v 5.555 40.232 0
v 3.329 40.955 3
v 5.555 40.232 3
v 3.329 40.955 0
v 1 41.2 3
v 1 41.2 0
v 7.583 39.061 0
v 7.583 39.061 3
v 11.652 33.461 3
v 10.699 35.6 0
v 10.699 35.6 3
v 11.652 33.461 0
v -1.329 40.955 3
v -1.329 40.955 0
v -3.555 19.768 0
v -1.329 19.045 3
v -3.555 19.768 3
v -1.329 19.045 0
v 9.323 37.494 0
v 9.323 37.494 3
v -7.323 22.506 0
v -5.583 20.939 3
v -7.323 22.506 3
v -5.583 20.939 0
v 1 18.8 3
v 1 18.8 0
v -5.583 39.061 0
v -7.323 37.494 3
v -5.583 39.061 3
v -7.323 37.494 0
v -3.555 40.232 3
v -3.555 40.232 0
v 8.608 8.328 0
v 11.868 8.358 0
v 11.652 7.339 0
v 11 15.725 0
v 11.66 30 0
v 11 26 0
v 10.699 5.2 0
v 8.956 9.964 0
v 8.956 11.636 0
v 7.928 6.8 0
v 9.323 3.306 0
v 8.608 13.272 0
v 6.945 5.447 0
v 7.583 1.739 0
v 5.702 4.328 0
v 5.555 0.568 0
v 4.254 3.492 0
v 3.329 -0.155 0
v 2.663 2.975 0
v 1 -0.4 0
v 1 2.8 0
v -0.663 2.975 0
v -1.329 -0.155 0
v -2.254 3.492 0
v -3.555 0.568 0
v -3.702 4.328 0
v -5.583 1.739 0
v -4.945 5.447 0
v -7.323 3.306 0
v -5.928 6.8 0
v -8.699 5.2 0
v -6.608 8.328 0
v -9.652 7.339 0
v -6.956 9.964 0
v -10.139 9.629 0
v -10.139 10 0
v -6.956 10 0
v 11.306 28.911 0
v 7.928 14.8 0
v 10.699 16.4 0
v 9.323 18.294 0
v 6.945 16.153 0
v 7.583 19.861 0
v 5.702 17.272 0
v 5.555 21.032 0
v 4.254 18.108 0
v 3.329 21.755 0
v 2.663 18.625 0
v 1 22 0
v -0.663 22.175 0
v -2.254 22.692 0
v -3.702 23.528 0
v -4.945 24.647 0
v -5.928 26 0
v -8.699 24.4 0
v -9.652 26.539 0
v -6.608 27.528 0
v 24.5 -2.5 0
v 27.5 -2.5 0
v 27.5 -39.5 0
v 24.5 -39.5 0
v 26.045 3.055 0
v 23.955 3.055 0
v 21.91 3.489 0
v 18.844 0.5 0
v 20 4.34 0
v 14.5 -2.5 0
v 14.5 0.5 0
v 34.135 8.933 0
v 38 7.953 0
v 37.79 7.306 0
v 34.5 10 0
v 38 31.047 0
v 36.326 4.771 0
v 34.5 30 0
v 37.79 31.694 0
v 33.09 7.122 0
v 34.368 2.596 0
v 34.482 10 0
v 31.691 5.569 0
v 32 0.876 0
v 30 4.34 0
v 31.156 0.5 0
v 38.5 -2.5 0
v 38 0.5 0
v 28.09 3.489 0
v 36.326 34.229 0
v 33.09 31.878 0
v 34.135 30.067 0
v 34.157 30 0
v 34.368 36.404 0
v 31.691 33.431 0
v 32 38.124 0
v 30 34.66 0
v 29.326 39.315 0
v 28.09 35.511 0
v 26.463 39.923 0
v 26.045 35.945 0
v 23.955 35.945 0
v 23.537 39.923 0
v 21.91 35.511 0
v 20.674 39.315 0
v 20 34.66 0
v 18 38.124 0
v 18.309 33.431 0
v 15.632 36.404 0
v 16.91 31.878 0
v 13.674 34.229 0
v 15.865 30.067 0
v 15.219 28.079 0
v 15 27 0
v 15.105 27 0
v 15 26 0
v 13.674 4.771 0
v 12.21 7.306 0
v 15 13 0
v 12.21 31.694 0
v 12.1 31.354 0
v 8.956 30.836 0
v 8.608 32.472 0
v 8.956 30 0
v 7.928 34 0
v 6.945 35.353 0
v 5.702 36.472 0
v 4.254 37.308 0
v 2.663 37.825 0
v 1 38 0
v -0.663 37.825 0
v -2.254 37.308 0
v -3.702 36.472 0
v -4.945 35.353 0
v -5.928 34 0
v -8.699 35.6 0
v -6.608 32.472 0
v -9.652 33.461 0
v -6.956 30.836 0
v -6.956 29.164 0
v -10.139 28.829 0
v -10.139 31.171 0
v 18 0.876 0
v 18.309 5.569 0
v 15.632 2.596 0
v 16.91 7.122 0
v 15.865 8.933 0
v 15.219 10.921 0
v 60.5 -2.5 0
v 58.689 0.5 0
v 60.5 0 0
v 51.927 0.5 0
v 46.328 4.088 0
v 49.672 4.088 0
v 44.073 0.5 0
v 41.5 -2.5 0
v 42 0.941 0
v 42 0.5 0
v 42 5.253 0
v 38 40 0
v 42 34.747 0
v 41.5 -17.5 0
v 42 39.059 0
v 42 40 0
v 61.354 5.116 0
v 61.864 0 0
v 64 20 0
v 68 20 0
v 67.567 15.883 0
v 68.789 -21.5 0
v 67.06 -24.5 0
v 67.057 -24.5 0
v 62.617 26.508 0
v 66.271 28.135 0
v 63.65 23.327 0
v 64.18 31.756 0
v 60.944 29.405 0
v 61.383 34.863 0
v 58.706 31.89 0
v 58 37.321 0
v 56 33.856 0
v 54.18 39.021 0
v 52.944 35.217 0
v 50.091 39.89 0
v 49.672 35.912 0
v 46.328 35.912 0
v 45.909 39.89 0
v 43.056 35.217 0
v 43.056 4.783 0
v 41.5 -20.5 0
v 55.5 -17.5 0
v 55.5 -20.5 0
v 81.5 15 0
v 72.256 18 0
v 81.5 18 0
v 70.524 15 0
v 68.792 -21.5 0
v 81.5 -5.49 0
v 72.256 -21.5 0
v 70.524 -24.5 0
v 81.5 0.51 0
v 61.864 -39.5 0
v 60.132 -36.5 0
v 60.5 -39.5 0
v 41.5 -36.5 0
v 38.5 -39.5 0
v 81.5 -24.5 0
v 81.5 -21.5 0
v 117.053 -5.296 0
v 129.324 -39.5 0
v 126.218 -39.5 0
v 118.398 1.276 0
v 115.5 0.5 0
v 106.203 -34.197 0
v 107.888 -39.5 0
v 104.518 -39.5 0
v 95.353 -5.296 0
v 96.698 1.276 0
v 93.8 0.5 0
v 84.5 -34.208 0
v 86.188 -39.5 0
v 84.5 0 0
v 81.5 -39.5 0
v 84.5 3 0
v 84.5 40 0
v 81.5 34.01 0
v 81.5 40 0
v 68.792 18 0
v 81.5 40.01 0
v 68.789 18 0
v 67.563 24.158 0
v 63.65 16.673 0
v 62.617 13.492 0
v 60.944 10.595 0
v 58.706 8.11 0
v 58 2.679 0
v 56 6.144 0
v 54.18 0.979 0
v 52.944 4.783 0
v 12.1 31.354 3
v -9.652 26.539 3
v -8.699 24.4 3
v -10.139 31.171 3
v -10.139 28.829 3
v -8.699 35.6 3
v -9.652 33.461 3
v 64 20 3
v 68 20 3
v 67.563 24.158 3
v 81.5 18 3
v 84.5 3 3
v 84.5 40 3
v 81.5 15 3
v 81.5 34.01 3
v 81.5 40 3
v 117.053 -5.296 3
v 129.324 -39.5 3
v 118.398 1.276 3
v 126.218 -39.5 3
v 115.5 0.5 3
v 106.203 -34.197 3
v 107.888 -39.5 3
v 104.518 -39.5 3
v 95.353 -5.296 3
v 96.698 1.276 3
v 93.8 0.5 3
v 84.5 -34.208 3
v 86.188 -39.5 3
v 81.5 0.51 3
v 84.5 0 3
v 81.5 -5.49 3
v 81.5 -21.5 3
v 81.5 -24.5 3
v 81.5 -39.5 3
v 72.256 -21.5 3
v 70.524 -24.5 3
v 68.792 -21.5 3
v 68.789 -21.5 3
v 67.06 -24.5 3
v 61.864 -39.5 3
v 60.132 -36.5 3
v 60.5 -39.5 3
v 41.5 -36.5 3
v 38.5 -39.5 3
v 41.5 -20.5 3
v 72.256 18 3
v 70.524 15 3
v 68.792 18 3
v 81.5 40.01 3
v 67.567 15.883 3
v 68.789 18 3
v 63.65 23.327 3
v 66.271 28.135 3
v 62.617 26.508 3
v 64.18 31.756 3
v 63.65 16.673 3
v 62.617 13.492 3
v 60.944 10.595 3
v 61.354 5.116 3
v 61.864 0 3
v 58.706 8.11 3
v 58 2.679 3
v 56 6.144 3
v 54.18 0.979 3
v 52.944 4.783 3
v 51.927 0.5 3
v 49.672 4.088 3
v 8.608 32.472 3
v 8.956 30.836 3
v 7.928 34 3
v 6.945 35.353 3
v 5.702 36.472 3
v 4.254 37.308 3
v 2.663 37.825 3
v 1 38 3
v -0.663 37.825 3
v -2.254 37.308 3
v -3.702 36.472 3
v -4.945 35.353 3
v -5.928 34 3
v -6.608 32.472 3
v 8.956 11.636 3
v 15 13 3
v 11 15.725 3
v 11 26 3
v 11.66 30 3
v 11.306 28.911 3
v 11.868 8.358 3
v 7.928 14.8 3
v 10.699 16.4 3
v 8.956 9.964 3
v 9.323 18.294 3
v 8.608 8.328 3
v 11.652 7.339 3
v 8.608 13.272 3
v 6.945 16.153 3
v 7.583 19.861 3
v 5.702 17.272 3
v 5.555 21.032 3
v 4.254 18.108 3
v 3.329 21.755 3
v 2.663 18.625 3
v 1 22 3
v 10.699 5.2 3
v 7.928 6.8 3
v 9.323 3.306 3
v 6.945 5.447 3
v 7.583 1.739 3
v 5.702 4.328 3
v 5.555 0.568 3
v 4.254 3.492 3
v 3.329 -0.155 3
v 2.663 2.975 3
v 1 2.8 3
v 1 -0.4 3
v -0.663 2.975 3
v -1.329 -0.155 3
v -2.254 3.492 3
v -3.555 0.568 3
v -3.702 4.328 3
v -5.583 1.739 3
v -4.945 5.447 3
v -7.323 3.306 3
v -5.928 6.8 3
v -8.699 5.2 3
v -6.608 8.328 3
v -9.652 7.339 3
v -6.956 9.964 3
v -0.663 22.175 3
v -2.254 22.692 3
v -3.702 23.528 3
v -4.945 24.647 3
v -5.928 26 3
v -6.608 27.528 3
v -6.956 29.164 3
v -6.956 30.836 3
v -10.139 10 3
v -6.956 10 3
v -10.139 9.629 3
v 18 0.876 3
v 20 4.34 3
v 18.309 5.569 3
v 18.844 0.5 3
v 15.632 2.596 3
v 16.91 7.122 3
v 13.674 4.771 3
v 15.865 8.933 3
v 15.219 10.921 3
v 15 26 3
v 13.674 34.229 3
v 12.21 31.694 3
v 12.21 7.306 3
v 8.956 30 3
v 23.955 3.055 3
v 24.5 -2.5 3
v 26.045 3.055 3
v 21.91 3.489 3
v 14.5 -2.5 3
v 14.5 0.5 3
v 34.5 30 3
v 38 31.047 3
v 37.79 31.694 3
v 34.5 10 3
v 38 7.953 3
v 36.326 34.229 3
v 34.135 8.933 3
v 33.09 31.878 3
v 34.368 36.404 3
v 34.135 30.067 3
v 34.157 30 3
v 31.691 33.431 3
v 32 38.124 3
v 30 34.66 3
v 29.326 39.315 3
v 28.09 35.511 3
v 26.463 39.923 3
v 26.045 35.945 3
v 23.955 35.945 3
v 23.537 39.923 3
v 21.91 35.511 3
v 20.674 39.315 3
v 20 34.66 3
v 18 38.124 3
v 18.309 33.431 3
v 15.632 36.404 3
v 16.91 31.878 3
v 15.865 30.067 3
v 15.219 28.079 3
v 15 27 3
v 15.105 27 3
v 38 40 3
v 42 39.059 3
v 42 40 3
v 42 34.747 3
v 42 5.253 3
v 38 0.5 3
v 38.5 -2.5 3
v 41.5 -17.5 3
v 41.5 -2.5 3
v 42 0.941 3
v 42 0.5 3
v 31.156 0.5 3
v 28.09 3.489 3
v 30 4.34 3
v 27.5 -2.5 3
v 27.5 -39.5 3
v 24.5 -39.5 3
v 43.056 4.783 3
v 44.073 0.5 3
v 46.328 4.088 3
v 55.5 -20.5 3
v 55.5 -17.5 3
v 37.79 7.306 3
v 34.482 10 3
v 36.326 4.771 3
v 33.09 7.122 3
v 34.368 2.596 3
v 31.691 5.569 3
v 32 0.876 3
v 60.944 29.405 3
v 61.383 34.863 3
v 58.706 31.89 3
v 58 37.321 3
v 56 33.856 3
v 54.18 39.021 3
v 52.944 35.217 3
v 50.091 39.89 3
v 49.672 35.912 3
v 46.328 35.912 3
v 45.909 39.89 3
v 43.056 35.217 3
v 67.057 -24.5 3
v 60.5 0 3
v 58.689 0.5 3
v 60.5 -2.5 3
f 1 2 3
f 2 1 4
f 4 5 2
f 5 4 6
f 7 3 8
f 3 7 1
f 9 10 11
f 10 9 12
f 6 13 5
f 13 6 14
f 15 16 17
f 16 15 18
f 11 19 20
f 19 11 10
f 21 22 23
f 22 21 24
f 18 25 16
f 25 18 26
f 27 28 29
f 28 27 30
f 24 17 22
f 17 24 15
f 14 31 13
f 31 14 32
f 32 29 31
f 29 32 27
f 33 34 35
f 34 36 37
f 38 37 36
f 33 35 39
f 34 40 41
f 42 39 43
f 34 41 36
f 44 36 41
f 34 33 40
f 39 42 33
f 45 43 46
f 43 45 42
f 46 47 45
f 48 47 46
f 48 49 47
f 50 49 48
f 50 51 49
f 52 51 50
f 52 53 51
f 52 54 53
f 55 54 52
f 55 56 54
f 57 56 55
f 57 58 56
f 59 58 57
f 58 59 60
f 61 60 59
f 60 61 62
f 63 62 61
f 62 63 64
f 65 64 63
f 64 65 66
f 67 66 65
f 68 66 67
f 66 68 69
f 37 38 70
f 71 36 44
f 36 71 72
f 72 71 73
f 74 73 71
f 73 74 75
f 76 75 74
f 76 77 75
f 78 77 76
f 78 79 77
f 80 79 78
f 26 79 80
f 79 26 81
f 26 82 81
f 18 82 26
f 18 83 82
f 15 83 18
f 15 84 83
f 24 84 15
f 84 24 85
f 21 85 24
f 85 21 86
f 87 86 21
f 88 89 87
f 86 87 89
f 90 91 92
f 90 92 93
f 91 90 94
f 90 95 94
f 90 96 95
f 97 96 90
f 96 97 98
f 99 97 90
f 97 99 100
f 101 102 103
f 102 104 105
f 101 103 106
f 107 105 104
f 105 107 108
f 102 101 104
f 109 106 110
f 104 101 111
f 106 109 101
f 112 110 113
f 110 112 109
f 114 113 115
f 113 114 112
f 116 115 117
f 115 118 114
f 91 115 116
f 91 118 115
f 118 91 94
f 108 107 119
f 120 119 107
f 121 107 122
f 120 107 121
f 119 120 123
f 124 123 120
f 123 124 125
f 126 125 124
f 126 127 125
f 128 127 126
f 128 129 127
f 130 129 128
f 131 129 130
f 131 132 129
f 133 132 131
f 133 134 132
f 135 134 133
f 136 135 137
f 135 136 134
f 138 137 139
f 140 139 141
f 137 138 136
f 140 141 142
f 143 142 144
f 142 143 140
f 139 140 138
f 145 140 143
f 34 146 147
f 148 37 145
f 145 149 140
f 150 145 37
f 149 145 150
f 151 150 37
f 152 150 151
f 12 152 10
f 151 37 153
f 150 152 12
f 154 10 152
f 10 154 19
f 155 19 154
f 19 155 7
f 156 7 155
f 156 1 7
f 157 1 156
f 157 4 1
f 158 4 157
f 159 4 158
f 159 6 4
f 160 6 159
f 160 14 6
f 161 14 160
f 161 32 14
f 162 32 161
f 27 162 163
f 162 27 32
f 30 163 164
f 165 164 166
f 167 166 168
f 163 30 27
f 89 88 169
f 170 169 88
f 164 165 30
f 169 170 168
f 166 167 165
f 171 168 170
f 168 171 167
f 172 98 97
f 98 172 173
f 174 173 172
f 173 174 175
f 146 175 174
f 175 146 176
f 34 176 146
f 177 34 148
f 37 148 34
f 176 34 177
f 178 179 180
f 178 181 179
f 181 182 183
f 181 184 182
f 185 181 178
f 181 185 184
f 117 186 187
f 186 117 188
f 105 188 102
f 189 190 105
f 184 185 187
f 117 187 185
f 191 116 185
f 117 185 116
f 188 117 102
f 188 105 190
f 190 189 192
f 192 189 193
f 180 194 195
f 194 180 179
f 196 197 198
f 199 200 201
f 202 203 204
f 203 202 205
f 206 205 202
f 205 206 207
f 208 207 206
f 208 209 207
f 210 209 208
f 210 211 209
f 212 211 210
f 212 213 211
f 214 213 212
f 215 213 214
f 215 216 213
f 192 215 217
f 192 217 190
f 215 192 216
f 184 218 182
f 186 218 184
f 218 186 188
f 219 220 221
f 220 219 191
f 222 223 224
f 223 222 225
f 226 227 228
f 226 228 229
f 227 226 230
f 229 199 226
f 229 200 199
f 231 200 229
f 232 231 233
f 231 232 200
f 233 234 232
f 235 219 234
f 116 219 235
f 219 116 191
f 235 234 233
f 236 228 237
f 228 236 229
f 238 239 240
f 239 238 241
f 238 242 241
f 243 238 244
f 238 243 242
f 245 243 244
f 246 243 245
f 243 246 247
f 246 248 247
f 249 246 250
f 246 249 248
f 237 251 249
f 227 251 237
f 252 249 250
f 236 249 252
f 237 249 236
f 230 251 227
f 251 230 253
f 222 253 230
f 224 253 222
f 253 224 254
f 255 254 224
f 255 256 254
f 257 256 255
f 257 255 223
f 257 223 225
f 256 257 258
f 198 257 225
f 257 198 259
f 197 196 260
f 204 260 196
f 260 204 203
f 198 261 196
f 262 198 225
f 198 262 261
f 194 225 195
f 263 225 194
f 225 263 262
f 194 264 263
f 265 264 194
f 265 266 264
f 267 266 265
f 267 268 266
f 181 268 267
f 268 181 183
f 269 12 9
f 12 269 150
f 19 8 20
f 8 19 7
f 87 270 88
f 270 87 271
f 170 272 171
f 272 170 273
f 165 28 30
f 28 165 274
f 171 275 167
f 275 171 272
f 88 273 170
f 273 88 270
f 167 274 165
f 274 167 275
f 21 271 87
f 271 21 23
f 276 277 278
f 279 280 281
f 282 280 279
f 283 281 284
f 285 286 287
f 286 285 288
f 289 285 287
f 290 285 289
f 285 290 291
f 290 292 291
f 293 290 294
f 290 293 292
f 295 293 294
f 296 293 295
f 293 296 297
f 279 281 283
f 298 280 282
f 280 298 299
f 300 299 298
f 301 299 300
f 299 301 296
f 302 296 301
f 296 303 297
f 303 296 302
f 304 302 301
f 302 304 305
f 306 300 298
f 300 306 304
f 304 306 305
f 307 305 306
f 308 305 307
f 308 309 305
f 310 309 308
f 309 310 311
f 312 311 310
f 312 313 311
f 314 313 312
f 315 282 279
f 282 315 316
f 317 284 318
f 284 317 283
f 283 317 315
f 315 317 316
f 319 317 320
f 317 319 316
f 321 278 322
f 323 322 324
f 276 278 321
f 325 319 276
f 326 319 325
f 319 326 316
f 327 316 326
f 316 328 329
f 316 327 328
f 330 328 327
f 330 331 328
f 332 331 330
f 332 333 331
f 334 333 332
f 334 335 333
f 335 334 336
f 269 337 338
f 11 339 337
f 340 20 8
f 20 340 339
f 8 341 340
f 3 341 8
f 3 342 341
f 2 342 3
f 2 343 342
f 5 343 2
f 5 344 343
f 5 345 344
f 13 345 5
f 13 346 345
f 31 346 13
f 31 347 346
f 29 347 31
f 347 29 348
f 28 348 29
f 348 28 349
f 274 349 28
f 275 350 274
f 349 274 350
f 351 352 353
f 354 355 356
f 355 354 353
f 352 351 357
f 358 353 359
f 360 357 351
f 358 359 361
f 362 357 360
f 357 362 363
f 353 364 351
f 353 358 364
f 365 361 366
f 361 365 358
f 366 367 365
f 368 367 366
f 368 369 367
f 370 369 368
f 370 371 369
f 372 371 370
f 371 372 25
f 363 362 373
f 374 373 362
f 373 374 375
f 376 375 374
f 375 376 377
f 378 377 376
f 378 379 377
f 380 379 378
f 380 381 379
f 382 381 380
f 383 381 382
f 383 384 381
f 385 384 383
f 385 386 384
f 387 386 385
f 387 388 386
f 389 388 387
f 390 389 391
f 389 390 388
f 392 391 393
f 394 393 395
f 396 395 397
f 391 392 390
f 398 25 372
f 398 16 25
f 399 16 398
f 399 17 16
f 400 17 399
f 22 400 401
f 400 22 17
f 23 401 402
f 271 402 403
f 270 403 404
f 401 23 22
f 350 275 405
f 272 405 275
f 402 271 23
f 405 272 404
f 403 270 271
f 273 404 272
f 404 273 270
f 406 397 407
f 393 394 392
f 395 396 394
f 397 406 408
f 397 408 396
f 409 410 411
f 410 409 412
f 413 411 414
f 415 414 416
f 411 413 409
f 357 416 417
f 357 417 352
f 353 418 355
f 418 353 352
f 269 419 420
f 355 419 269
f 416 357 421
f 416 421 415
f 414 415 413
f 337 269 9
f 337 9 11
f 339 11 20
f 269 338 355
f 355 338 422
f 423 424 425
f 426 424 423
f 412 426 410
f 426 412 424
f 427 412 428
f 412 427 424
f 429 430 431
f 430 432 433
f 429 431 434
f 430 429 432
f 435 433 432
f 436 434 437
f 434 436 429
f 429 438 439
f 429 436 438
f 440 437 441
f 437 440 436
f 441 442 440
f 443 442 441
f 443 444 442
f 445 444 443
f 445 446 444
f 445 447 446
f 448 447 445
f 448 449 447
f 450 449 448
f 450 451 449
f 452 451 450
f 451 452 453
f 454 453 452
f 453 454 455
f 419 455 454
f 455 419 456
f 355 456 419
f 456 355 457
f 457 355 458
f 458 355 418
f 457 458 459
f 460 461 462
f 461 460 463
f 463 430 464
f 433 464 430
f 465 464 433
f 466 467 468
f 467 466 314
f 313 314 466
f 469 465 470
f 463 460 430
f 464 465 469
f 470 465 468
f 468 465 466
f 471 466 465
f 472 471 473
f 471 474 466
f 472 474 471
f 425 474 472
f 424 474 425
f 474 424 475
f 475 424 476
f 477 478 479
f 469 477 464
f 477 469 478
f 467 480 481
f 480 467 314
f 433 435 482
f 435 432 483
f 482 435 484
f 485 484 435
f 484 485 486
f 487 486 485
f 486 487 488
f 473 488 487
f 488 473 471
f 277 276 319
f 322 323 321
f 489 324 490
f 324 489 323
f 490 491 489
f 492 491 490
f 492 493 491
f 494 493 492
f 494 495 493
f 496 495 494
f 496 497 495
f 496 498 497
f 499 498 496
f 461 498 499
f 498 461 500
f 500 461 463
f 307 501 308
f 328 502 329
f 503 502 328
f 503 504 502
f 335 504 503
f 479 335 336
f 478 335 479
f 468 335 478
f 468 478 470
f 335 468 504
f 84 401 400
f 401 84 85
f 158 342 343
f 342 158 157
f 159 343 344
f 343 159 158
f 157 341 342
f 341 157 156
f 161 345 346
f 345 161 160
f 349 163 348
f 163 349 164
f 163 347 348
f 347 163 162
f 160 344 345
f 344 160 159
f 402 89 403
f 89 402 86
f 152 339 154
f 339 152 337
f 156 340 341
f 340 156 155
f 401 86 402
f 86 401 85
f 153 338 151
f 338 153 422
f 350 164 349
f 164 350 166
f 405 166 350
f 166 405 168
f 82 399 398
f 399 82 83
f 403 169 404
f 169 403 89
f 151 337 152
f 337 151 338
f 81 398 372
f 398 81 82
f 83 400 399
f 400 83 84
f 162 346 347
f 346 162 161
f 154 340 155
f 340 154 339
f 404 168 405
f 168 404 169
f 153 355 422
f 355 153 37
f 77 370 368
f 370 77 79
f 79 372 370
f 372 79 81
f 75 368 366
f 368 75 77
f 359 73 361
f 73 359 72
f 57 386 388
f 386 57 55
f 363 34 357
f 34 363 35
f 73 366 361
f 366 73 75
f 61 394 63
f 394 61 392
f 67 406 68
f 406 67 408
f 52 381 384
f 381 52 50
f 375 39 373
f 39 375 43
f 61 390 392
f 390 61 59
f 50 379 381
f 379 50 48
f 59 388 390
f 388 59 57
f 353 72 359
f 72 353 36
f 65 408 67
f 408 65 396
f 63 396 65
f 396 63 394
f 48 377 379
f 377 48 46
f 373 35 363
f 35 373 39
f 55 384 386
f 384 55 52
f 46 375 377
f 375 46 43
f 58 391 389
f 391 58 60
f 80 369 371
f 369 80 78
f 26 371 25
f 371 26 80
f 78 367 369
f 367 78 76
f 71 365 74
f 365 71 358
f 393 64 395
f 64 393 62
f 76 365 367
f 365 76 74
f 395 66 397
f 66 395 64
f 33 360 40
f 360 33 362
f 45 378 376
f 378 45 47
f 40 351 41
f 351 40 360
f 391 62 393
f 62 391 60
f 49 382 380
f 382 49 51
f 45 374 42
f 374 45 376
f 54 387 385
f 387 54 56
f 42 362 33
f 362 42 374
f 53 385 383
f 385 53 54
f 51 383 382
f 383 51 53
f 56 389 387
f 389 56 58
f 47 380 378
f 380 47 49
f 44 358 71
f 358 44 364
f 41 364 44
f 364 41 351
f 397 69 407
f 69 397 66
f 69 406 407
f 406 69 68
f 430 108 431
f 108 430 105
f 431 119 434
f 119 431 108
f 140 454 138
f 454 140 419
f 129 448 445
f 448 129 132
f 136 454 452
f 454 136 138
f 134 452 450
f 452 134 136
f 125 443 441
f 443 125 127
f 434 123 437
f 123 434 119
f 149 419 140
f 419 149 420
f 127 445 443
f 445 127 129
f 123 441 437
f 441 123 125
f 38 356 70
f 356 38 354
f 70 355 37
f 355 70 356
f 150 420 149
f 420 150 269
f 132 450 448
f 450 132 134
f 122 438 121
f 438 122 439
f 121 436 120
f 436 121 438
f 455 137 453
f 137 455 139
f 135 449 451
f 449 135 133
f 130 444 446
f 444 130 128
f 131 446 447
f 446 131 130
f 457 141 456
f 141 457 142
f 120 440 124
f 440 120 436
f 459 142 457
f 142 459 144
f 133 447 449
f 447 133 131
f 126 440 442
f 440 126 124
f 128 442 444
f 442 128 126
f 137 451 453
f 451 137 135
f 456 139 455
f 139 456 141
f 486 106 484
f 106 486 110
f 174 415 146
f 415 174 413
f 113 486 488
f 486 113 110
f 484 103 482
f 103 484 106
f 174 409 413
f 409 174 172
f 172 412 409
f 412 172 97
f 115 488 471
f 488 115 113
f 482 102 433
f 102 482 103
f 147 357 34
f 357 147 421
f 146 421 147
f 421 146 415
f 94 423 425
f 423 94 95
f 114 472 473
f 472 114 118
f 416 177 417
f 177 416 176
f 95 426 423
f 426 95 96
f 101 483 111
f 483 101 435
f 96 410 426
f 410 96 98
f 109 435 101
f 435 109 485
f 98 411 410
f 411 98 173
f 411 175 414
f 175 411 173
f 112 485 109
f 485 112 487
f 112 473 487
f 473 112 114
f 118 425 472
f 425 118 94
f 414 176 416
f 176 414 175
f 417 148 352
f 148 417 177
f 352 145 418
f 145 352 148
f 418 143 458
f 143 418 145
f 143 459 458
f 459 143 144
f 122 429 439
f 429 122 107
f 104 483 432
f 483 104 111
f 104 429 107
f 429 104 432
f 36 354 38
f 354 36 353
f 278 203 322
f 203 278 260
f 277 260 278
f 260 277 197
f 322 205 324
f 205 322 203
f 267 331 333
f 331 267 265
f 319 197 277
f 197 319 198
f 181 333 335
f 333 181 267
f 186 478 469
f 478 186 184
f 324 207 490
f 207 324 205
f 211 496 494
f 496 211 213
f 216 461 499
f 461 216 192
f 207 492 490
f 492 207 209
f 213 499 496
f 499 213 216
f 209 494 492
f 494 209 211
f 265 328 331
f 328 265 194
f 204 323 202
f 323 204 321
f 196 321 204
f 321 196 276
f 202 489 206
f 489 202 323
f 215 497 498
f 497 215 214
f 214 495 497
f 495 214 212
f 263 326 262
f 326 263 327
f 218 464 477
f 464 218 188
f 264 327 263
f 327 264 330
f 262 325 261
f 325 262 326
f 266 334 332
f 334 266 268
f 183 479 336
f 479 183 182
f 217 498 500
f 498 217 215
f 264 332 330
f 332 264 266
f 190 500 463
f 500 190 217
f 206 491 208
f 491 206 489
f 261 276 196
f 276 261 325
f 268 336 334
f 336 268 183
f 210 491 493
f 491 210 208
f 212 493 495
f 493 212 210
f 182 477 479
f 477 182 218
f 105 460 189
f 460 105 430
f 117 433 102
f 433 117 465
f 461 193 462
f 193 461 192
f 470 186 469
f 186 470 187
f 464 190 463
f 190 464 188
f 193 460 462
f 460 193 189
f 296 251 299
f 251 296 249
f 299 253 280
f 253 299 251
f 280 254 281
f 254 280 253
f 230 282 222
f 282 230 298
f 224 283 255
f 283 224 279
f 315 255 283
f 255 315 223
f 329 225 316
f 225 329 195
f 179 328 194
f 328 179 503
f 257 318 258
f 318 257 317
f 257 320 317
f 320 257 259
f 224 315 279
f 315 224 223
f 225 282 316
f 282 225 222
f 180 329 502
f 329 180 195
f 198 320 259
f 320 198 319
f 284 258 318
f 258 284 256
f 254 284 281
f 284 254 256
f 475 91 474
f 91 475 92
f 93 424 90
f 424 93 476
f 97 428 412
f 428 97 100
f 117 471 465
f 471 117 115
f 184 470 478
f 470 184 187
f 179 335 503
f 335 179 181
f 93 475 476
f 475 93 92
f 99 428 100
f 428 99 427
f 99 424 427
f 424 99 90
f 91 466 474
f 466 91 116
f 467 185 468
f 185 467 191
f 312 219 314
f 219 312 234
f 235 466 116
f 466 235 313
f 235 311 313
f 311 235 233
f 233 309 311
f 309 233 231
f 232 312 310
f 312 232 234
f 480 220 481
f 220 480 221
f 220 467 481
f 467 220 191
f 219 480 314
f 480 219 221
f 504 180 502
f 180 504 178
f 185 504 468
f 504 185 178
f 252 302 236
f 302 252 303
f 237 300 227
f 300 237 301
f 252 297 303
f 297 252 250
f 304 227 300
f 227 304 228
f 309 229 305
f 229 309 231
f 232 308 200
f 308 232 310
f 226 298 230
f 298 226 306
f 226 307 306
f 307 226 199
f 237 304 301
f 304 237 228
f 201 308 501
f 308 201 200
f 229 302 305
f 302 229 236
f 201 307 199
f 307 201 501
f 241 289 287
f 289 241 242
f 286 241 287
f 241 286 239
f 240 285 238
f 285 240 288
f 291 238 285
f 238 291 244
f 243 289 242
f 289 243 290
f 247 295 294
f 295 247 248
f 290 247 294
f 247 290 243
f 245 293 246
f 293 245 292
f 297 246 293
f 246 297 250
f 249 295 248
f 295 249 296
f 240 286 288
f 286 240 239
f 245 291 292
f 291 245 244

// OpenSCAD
union(){

// S
 translate([1,30,3])
rotate([180,0,90]){
scale([0.8,0.8,1]){
union(){
difference(){
 cylinder(3,14,14);
translate([0,0,-1]) cylinder(5,10,10);
 translate([-20,0,-1]) cube(20);

}
}
difference(){
 translate([-24,0,0]) cylinder(3,14,14);
 translate([-24,0,-1]) cylinder(5,10,10);
 translate([-25,-20,-1]) cube(20);

}
}
}

// буква О
translate([-15,0,0])
union(){
  translate([49.5,10,0]) cube([4,20,3]);
  translate([26,13,0]) cube([4,13,3]);
difference(){
union(){
	
  difference(){
  translate([40,26,0]) cylinder(3,14,14);
  translate([40,26,-1]) cylinder(5,10,10);
  translate([33,10,-1]) cube([20,10,5]);

}

difference(){
  translate([40,13,0]) cylinder(3,14,14);
  translate([40,13,-1]) cylinder(5,10,10);
  translate([32,17,-1]) cube([19,10,5]);
  translate([40,17,-1]) cube(20);
}
}
  translate([30,13,-1]) cube([5,14,5]);
  translate([42,10,-1]) cube(20);
}
}

//D
translate([43,0,0]) 
union(){
   translate([-5,0,0]) cube([4,40,3]);
 difference(){
    translate([5,20,0]) cylinder(3,20,20);
     translate([5,20,-1]) cylinder(6,16,16);
      translate([-15,0,-1]) cube([10,40,6]);
}
}
 
//A
translate([81.5,0,0])
 union(){
    difference(){
   union(){
    cube([3,40,3]);
   translate([-23.1,0,0]) rotate([0,0,-30])  cube([3,50,3]);
   translate([-15,15,0]) cube([20,3,3]);
}
   translate([-40,-8,-1]) cube([30,8,5]);
   translate([3,3,-1]) cube([10,40,5]);
  translate([-34.65,0,-1]) rotate([0,0,-30]) cube([10,40,5]);
  translate([0,40,-1]) cube(10);
}
}  


//TEAM
 
  translate([2.5,-39.5,0]){
   translate([22,0,0])

//T 
  union(){
  union(){ 
  cube([3,40,3]);
   translate([-10,37,0]) cube([25,3,3]);
}
}

//E
  translate([36,0,0])
   union(){ 
    cube([3,40,3]);
    cube([22,3,3]);
     translate([0,19,0]) cube([17,3,3]);
     translate([0,37,0]) cube([22,3,3]);
}

//A
   translate([79,0,0])
  union(){
    difference(){
  union(){
   cube([3,40,3]);
   translate([-23.1,0,0]) rotate([0,0,-30])  cube([3,50,3]);
   translate([-15,15,0]) cube([20,3,3]);
}
  translate([-40,-8,-1]) cube([60,8,5]);
  translate([3,3,-1]) cube([10,40,5]);
  translate([-34.65,0,-1]) rotate([0,0,-30]) cube([10,40,5]);
  translate([0,42,-1]) cube(10);
}
}  


//M
translate([129,40,0])
  rotate([0,0,-90])
difference(){
union(){
  translate([0,-16,0]) rotate([0,0,15]) cube([43,3,3]);
  translate([0,-16,0]) rotate([0,0,-15]) cube([43,3,3]);

 translate([0,-37.7,0]) rotate([0,0,15]) cube([43,3,3]);

 translate([0,-37.7,0])
  rotate([0,0,-15]) cube([43,3,3]);
}
 translate([40,-60,0]) cube([5,60,6]);
}
}
}
